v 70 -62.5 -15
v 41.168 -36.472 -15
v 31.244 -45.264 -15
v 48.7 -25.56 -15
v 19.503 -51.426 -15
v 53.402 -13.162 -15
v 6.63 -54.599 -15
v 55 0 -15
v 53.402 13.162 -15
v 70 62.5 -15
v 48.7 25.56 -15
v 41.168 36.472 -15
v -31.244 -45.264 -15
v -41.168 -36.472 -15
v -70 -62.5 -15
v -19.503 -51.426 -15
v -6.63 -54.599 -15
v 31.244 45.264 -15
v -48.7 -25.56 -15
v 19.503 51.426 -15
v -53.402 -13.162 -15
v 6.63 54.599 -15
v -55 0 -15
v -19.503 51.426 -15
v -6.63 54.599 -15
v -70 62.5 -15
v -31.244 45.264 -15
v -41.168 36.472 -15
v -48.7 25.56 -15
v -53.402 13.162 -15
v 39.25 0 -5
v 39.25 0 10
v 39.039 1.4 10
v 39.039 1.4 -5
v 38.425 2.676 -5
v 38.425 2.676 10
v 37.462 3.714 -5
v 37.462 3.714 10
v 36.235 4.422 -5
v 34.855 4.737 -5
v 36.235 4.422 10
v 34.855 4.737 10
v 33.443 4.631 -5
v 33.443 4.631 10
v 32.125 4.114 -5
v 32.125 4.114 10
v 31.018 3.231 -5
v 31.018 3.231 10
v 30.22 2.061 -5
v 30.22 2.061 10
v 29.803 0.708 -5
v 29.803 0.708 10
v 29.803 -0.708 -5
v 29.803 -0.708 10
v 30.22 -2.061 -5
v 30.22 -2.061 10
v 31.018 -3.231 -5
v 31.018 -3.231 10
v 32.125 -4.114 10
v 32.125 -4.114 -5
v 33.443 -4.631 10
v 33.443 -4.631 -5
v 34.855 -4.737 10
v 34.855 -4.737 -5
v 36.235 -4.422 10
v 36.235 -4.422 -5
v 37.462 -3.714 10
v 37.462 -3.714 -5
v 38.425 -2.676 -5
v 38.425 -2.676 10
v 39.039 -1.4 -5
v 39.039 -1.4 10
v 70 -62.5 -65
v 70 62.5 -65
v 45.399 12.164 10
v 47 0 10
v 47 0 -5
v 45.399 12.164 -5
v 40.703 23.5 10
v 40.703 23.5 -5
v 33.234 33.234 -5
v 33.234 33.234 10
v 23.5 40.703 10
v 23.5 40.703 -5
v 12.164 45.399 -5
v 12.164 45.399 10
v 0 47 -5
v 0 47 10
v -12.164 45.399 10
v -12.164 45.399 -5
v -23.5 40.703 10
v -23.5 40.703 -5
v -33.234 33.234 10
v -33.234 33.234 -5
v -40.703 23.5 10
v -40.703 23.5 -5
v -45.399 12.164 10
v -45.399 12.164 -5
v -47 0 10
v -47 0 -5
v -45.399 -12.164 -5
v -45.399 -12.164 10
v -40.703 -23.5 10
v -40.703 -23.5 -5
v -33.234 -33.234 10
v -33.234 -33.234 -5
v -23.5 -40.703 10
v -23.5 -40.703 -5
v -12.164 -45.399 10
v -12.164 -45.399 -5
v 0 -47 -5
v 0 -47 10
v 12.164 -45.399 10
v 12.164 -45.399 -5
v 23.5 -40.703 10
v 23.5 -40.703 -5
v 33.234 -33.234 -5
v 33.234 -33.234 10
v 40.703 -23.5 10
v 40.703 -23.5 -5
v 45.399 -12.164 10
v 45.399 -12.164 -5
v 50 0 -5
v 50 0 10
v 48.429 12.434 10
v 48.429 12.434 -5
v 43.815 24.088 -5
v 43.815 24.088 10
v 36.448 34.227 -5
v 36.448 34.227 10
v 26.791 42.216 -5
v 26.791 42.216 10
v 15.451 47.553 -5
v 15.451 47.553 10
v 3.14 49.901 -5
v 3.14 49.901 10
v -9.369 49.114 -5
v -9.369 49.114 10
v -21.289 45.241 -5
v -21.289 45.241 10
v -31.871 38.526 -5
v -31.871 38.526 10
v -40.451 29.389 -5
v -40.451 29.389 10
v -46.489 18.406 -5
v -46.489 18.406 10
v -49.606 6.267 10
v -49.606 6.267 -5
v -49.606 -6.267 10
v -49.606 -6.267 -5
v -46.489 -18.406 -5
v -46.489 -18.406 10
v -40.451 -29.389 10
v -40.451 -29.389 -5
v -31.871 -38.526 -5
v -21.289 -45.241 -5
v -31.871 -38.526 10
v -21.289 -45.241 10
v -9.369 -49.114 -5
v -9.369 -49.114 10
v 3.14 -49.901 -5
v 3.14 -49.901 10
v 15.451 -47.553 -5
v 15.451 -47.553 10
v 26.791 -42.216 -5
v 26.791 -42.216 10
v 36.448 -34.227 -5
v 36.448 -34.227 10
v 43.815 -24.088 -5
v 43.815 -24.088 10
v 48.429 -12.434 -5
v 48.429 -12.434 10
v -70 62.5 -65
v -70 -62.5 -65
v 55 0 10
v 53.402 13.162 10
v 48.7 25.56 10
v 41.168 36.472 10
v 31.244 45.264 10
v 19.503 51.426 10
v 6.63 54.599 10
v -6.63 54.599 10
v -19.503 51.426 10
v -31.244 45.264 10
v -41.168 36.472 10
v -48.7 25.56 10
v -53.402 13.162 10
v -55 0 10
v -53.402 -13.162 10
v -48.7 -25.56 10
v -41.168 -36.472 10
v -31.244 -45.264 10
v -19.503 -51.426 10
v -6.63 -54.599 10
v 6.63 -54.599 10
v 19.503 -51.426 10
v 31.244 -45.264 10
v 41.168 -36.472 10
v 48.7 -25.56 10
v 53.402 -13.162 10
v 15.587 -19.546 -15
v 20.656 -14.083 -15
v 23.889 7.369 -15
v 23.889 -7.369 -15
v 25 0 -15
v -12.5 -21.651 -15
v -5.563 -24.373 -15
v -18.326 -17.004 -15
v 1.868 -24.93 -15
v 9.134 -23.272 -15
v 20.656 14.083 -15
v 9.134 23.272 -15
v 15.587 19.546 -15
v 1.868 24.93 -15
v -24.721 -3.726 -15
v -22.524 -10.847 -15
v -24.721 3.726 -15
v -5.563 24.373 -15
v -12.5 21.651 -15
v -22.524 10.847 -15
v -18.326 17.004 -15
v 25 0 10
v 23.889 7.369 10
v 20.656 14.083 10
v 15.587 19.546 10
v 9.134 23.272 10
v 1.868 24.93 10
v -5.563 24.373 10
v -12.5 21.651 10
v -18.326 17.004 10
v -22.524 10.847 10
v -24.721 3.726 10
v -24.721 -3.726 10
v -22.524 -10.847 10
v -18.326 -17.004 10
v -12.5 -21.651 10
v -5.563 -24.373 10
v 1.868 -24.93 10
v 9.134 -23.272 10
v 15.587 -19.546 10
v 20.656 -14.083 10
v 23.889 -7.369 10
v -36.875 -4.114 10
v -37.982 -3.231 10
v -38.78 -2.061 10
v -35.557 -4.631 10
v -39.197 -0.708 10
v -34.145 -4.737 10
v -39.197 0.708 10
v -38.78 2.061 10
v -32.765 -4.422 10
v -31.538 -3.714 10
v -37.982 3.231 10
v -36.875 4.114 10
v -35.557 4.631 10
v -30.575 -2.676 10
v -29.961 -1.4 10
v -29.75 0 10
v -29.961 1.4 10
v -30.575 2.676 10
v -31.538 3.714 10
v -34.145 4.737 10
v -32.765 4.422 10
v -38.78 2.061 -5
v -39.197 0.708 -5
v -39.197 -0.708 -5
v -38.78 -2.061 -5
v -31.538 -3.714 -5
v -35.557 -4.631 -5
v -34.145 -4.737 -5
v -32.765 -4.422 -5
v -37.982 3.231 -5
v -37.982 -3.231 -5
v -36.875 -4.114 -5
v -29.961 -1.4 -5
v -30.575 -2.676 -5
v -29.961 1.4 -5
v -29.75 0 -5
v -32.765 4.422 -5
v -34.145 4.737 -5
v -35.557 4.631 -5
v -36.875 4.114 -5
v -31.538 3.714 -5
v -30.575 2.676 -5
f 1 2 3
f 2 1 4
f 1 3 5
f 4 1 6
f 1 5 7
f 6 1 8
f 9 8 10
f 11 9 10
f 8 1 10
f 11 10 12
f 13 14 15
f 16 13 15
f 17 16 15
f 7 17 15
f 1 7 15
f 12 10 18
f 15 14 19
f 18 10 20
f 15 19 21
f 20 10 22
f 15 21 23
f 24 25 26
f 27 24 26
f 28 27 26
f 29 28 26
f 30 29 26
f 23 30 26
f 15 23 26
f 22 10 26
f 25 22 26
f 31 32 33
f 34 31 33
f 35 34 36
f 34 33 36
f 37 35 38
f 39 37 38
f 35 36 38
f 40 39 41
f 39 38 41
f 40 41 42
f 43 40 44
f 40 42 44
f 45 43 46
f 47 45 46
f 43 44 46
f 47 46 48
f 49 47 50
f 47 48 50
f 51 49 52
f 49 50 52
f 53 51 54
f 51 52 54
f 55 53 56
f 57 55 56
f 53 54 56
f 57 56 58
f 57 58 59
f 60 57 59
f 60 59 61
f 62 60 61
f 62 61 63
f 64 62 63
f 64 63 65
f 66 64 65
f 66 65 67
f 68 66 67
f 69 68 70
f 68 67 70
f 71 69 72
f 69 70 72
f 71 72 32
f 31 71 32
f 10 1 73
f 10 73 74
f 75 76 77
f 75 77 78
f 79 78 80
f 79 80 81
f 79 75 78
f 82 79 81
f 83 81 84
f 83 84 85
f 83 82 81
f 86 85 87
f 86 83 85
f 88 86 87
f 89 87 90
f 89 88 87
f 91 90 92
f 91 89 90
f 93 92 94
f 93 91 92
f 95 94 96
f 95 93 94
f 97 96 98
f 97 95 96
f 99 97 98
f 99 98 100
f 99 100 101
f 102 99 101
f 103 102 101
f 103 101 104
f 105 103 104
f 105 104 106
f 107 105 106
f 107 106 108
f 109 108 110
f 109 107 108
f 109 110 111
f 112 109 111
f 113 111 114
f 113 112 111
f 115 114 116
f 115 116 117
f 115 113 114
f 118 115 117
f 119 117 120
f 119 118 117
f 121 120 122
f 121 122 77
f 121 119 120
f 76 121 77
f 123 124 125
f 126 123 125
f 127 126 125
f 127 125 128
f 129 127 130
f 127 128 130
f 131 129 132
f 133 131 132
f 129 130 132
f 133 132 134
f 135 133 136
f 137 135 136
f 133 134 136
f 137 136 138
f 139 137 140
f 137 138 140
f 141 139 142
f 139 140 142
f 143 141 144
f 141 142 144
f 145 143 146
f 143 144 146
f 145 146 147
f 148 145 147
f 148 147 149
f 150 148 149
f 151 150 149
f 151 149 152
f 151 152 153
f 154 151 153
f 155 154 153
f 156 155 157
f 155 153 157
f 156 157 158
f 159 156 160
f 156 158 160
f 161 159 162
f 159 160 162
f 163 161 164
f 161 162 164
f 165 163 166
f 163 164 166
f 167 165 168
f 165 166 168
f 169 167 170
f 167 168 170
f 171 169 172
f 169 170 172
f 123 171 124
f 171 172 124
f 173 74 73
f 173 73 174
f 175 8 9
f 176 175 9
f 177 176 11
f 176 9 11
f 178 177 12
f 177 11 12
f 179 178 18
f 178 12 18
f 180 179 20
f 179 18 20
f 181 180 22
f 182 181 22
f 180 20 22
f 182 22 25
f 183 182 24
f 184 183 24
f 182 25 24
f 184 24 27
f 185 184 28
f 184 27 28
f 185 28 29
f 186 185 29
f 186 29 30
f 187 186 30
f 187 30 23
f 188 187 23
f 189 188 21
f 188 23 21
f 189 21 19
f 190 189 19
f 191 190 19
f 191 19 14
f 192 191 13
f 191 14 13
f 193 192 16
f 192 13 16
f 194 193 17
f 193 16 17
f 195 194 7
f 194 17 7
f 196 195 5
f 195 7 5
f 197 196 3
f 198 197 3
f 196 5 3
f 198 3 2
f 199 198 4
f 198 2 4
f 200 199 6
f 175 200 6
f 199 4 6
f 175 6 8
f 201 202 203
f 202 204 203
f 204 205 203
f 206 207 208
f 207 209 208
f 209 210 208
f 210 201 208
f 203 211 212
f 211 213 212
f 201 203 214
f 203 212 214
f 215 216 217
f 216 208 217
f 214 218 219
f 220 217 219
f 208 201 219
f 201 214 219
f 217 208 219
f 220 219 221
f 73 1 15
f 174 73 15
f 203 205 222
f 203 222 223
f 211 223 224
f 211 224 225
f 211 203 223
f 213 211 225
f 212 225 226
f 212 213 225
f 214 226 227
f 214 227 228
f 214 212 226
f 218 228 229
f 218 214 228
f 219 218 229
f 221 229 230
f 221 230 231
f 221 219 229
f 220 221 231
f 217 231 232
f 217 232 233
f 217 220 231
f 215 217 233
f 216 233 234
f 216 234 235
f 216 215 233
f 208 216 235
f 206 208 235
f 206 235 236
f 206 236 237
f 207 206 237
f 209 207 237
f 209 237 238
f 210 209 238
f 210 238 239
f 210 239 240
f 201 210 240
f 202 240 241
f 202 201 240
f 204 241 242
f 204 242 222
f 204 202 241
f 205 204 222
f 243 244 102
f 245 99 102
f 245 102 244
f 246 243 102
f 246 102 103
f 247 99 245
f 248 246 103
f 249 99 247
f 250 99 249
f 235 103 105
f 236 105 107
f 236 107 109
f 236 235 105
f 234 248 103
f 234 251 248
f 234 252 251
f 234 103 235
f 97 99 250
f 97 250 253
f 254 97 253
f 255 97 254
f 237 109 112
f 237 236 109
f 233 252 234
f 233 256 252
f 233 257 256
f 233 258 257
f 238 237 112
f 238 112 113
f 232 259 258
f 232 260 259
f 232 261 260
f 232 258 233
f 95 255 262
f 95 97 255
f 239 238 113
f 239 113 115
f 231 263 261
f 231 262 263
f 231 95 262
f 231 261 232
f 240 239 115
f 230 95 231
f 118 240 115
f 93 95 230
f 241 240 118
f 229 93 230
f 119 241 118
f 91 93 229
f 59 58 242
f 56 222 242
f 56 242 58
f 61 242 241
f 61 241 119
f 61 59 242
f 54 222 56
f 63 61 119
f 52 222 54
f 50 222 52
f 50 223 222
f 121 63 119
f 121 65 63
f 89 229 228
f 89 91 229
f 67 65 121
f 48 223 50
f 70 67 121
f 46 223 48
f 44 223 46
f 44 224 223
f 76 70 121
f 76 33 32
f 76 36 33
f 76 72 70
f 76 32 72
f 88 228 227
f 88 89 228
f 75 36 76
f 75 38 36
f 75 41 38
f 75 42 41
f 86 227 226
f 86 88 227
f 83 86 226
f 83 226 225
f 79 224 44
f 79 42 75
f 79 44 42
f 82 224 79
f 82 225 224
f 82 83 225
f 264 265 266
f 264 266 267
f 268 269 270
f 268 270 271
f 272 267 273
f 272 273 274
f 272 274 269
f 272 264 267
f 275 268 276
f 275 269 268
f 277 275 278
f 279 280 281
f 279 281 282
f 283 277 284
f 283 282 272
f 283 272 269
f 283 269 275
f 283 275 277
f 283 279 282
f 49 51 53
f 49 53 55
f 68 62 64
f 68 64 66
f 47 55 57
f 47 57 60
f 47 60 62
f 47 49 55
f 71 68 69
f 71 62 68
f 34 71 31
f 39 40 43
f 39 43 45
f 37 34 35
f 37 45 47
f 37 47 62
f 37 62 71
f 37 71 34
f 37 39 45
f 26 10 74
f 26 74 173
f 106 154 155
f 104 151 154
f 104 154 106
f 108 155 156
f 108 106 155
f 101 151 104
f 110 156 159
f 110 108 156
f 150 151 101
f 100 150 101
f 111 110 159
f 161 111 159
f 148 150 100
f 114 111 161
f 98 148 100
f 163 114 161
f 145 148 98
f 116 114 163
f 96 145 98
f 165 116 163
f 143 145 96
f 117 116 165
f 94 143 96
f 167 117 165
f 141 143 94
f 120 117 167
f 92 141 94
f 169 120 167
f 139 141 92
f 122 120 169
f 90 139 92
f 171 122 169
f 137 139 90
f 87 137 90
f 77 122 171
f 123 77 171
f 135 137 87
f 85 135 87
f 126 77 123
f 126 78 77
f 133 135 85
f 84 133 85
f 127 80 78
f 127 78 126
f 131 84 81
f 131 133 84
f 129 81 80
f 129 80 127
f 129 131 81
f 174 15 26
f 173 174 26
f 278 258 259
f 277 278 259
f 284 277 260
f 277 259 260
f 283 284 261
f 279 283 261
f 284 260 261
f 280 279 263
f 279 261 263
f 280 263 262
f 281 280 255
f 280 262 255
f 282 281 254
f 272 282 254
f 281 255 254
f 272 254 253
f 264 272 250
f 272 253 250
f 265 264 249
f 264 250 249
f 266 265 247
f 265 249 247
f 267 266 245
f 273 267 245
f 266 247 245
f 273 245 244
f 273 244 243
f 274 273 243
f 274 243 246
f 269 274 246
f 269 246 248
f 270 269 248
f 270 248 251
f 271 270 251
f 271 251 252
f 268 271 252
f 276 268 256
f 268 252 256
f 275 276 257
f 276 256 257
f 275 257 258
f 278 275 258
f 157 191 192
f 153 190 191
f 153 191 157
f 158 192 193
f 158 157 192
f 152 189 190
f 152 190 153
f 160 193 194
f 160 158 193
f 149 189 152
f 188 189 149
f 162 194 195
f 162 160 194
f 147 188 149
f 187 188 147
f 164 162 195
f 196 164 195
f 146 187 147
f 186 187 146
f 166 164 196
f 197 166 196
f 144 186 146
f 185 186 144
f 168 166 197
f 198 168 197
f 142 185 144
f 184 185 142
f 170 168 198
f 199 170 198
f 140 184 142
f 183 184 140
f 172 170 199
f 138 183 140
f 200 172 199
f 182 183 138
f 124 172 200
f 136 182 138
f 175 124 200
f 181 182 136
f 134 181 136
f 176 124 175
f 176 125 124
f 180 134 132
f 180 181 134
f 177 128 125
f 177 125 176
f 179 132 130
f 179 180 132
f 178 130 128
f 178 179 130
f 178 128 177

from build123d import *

# Parameters (mm, degrees)
BOSS_EXTRUDE1_DEPTH      = 10
BOSS_EXTRUDE1_DEPTH_BACK = 15
SKETCH1_R                = 55
SKETCH1_R_2              = 25
SKETCH2_R                = 50
SKETCH2_R_2              = 47
SKETCH2_R_3              = 4.75
CUT_EXTRUDE1_DEPTH       = 15
SKETCH4_W                = 140
SKETCH4_H                = 125
BOSS_EXTRUDE3_DEPTH      = 50


with BuildPart() as part:
    # Sketch1 → Boss-Extrude1 (new, two sides: drawn at the far end of the back side and taken through both)
    with BuildSketch(Plane.XY.offset(-BOSS_EXTRUDE1_DEPTH_BACK)):
        Circle(SKETCH1_R)
        Circle(SKETCH1_R_2, mode=Mode.SUBTRACT)
    extrude(amount=BOSS_EXTRUDE1_DEPTH + BOSS_EXTRUDE1_DEPTH_BACK)

    # Sketch2 → Cut-Extrude1 (cut)
    # profile 1 of 3: a face of its own
    with BuildSketch(Plane.XY.offset(10)):
        Circle(SKETCH2_R)
        Circle(SKETCH2_R_2, mode=Mode.SUBTRACT)
    # profile 2 of 3: a face of its own
    with BuildSketch(Plane.XY.offset(10)):
        with Locations((-34.5, 0)):
            Circle(SKETCH2_R_3)
    # profile 3 of 3: a face of its own
    with BuildSketch(Plane.XY.offset(10)):
        with Locations((34.5, 0)):
            Circle(SKETCH2_R_3)
    extrude(amount=-CUT_EXTRUDE1_DEPTH, mode=Mode.SUBTRACT)

    # Sketch4 → Boss-Extrude3 (add)
    with BuildSketch(Plane(origin=(0, 0, -15), x_dir=(-1, 0, 0), z_dir=(0, 0, -1))):
        Rectangle(SKETCH4_W, SKETCH4_H)
    extrude(amount=BOSS_EXTRUDE3_DEPTH)


solid = part.part
